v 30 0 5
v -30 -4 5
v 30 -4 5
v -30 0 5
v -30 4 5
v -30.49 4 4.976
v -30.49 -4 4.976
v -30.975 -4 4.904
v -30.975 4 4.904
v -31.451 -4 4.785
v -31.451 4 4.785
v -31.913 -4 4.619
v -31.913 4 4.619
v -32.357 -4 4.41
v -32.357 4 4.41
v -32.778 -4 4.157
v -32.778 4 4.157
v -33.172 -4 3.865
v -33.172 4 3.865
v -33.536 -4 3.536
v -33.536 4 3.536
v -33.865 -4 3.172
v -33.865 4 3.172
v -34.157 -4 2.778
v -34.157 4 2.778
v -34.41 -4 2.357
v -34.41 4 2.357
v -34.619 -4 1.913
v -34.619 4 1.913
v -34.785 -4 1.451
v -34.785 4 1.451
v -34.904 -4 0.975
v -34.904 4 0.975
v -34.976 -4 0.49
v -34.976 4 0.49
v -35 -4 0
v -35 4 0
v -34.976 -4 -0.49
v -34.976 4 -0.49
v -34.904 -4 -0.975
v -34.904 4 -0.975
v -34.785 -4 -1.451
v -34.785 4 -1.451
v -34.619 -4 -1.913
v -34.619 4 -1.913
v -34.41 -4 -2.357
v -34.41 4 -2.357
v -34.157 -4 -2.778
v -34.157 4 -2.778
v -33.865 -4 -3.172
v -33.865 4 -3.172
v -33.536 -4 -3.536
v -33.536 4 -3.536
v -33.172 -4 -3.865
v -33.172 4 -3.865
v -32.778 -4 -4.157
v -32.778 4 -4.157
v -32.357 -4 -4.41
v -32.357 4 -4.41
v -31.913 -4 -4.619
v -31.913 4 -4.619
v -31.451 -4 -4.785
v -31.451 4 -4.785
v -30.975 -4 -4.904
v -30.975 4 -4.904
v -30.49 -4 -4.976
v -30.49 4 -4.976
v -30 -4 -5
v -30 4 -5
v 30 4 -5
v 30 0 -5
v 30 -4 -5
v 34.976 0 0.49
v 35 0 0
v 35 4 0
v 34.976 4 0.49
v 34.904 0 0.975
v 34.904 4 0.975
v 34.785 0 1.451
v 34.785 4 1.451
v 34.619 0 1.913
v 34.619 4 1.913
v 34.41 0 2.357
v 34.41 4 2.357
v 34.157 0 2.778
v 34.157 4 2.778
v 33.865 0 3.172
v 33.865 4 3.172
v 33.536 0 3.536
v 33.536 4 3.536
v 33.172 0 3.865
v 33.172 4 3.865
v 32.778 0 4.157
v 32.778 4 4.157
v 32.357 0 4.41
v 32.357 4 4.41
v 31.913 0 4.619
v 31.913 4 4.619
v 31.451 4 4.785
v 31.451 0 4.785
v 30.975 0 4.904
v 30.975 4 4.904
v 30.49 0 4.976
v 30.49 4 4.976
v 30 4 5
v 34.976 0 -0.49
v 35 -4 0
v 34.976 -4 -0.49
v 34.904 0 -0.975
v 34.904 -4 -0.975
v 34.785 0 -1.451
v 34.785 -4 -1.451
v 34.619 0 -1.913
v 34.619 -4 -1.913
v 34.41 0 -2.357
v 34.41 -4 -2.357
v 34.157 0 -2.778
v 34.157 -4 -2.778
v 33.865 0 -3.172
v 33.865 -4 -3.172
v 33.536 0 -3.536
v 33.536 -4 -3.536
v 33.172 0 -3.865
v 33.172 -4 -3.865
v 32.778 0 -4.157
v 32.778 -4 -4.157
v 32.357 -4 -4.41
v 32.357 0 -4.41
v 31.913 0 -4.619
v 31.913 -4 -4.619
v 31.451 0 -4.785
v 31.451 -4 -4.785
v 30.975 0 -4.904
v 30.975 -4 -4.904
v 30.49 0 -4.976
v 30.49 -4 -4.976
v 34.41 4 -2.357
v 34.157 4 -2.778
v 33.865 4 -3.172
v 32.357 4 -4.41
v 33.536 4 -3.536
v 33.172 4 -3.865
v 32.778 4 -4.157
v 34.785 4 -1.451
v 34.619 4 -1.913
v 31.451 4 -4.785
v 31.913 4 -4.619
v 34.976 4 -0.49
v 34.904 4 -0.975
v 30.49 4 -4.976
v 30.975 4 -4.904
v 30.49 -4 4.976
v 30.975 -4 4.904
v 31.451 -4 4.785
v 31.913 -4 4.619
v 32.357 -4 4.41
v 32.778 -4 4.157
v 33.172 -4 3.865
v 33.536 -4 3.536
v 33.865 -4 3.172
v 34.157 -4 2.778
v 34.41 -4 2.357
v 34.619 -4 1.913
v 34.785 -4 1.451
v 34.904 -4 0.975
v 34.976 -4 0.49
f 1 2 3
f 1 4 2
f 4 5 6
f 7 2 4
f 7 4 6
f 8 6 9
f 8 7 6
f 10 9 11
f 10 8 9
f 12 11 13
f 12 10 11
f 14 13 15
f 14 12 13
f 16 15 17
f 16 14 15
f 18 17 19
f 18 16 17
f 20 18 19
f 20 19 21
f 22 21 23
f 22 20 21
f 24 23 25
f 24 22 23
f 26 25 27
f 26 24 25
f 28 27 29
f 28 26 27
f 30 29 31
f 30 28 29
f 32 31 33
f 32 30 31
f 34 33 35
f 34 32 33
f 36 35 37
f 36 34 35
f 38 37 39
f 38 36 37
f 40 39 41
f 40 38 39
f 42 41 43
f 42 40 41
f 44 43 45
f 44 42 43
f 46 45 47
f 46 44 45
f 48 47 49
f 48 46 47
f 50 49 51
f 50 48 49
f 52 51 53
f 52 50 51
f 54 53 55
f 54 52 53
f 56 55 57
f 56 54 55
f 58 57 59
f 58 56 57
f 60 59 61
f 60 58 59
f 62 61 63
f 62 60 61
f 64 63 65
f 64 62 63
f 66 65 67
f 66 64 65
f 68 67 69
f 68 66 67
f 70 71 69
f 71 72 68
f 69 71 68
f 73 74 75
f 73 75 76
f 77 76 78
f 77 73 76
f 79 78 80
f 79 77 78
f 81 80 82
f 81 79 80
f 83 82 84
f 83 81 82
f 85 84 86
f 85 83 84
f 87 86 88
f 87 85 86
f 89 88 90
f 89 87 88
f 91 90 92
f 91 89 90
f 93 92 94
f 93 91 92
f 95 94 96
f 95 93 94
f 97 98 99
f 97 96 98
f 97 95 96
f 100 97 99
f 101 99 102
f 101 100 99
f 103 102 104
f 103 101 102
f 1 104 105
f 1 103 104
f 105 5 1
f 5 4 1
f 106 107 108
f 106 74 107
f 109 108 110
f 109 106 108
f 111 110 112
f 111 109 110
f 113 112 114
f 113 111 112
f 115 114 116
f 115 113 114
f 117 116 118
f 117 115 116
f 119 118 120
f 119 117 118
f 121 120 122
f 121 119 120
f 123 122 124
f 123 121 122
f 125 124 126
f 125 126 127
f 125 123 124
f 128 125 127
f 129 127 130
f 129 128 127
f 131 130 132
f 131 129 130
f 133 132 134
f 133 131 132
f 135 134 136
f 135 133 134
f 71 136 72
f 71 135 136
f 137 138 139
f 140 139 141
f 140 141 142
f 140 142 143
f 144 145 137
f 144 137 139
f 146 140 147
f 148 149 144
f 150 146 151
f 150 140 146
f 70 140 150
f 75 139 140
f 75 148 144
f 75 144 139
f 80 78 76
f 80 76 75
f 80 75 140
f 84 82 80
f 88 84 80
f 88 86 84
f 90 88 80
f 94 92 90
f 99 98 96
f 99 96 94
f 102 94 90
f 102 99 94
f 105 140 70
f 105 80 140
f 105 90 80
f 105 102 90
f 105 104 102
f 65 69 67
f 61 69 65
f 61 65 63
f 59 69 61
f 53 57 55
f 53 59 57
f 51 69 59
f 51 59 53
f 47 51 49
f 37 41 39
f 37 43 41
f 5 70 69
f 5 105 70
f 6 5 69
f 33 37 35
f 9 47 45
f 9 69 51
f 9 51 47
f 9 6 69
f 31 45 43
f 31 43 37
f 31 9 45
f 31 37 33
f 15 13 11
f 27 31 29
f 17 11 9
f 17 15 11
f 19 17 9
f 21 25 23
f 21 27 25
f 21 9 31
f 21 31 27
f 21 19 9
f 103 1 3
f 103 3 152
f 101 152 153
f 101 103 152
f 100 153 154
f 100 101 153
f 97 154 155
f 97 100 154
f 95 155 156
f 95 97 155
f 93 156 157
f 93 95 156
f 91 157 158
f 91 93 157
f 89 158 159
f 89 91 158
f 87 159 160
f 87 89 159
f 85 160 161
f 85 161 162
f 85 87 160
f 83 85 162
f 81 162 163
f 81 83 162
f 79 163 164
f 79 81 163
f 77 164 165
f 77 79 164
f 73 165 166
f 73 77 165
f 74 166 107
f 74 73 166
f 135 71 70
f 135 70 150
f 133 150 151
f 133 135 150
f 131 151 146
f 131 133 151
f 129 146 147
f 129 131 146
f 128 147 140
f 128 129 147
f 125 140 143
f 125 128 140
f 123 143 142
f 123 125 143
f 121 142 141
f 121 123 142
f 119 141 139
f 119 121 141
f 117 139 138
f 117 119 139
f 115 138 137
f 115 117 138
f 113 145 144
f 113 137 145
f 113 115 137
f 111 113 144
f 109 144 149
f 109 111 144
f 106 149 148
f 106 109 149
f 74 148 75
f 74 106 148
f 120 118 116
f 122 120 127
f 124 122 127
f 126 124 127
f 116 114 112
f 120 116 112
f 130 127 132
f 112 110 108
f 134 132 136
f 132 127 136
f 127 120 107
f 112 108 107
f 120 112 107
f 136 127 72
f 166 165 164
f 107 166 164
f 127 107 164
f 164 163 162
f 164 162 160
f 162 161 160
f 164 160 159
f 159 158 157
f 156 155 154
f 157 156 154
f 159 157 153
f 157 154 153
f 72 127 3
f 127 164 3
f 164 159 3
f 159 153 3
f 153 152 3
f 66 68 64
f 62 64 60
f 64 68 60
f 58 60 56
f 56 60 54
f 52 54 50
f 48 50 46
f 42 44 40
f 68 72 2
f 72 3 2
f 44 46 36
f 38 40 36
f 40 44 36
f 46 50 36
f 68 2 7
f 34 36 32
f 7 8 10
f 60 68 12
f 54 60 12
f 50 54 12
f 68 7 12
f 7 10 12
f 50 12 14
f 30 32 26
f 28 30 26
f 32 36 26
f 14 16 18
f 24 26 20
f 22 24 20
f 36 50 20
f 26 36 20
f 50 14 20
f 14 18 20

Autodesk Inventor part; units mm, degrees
sketch "Sketch_1" plane through (0, 0, 0) normal (0, 1, 0) x (-1, 0, 0)
  arc A0 (35, 0) -> (30, 5) centre (30, 0) ccw
  line L0 (30, 5) -> (-30, 5)
  arc A1 (-30, 5) -> (-35, 0) centre (-30, 0) ccw
  arc A2 (-35, 0) -> (-30, -5) centre (-30, 0) ccw
  line L1 (-30, -5) -> (30, -5)
  arc A3 (30, -5) -> (35, 0) centre (30, 0) ccw
extrude "Extrusion1" add sketch "Sketch_1" along normal mid plane 8
ref_plane "bp_b_oben_XY" through (30, 0, -5) normal (0, 1, 0) x (1, 0, 0)
ref_plane "bp_b_oben_YZ" through (30, 0, -5) normal (1, 0, 0) x (0, 0, -1)
ref_plane "bp_b_oben_ZX" through (30, 0, -5) normal (0, 0, -1) x (0, 1, 0)
ref_plane "bp_b_unten_XY" through (30, 0, 5) normal (0, 1, 0) x (1, 0, 0)
ref_plane "bp_b_unten_YZ" through (30, 0, 5) normal (1, 0, 0) x (0, 0, -1)
ref_plane "bp_b_unten_ZX" through (30, 0, 5) normal (0, 0, -1) x (0, 1, 0)
ref_plane "bp_h_oben_XY" through (0, 4, 0) normal (0, 0, 1) x (1, 0, 0)
ref_plane "bp_h_oben_YZ" through (0, 4, 0) normal (1, 0, 0) x (0, 1, 0)
ref_plane "bp_h_oben_ZX" through (0, 4, 0) normal (0, 1, 0) x (0, 0, 1)
ref_plane "bp_h_unten_XY" through (0, -4, 0) normal (0, 0, 1) x (1, 0, 0)
ref_plane "bp_h_unten_YZ" through (0, -4, 0) normal (1, 0, 0) x (0, 1, 0)
ref_plane "bp_h_unten_ZX" through (0, -4, 0) normal (0, 1, 0) x (0, 0, 1)
ref_plane "bp_l_links_XY" through (-35, 0, 0) normal (0, 1, 0) x (1, 0, 0)
ref_plane "bp_l_links_YZ" through (-35, 0, 0) normal (1, 0, 0) x (0, 0, -1)
ref_plane "bp_l_links_ZX" through (-35, 0, 0) normal (0, 0, -1) x (0, 1, 0)
ref_plane "bp_l_rechts_XY" through (35, 0, 0) normal (0, 1, 0) x (1, 0, 0)
ref_plane "bp_l_rechts_YZ" through (35, 0, 0) normal (1, 0, 0) x (0, 0, -1)
ref_plane "bp_l_rechts_ZX" through (35, 0, 0) normal (0, 0, -1) x (0, 1, 0)
properties part number "K0696.110X70"
